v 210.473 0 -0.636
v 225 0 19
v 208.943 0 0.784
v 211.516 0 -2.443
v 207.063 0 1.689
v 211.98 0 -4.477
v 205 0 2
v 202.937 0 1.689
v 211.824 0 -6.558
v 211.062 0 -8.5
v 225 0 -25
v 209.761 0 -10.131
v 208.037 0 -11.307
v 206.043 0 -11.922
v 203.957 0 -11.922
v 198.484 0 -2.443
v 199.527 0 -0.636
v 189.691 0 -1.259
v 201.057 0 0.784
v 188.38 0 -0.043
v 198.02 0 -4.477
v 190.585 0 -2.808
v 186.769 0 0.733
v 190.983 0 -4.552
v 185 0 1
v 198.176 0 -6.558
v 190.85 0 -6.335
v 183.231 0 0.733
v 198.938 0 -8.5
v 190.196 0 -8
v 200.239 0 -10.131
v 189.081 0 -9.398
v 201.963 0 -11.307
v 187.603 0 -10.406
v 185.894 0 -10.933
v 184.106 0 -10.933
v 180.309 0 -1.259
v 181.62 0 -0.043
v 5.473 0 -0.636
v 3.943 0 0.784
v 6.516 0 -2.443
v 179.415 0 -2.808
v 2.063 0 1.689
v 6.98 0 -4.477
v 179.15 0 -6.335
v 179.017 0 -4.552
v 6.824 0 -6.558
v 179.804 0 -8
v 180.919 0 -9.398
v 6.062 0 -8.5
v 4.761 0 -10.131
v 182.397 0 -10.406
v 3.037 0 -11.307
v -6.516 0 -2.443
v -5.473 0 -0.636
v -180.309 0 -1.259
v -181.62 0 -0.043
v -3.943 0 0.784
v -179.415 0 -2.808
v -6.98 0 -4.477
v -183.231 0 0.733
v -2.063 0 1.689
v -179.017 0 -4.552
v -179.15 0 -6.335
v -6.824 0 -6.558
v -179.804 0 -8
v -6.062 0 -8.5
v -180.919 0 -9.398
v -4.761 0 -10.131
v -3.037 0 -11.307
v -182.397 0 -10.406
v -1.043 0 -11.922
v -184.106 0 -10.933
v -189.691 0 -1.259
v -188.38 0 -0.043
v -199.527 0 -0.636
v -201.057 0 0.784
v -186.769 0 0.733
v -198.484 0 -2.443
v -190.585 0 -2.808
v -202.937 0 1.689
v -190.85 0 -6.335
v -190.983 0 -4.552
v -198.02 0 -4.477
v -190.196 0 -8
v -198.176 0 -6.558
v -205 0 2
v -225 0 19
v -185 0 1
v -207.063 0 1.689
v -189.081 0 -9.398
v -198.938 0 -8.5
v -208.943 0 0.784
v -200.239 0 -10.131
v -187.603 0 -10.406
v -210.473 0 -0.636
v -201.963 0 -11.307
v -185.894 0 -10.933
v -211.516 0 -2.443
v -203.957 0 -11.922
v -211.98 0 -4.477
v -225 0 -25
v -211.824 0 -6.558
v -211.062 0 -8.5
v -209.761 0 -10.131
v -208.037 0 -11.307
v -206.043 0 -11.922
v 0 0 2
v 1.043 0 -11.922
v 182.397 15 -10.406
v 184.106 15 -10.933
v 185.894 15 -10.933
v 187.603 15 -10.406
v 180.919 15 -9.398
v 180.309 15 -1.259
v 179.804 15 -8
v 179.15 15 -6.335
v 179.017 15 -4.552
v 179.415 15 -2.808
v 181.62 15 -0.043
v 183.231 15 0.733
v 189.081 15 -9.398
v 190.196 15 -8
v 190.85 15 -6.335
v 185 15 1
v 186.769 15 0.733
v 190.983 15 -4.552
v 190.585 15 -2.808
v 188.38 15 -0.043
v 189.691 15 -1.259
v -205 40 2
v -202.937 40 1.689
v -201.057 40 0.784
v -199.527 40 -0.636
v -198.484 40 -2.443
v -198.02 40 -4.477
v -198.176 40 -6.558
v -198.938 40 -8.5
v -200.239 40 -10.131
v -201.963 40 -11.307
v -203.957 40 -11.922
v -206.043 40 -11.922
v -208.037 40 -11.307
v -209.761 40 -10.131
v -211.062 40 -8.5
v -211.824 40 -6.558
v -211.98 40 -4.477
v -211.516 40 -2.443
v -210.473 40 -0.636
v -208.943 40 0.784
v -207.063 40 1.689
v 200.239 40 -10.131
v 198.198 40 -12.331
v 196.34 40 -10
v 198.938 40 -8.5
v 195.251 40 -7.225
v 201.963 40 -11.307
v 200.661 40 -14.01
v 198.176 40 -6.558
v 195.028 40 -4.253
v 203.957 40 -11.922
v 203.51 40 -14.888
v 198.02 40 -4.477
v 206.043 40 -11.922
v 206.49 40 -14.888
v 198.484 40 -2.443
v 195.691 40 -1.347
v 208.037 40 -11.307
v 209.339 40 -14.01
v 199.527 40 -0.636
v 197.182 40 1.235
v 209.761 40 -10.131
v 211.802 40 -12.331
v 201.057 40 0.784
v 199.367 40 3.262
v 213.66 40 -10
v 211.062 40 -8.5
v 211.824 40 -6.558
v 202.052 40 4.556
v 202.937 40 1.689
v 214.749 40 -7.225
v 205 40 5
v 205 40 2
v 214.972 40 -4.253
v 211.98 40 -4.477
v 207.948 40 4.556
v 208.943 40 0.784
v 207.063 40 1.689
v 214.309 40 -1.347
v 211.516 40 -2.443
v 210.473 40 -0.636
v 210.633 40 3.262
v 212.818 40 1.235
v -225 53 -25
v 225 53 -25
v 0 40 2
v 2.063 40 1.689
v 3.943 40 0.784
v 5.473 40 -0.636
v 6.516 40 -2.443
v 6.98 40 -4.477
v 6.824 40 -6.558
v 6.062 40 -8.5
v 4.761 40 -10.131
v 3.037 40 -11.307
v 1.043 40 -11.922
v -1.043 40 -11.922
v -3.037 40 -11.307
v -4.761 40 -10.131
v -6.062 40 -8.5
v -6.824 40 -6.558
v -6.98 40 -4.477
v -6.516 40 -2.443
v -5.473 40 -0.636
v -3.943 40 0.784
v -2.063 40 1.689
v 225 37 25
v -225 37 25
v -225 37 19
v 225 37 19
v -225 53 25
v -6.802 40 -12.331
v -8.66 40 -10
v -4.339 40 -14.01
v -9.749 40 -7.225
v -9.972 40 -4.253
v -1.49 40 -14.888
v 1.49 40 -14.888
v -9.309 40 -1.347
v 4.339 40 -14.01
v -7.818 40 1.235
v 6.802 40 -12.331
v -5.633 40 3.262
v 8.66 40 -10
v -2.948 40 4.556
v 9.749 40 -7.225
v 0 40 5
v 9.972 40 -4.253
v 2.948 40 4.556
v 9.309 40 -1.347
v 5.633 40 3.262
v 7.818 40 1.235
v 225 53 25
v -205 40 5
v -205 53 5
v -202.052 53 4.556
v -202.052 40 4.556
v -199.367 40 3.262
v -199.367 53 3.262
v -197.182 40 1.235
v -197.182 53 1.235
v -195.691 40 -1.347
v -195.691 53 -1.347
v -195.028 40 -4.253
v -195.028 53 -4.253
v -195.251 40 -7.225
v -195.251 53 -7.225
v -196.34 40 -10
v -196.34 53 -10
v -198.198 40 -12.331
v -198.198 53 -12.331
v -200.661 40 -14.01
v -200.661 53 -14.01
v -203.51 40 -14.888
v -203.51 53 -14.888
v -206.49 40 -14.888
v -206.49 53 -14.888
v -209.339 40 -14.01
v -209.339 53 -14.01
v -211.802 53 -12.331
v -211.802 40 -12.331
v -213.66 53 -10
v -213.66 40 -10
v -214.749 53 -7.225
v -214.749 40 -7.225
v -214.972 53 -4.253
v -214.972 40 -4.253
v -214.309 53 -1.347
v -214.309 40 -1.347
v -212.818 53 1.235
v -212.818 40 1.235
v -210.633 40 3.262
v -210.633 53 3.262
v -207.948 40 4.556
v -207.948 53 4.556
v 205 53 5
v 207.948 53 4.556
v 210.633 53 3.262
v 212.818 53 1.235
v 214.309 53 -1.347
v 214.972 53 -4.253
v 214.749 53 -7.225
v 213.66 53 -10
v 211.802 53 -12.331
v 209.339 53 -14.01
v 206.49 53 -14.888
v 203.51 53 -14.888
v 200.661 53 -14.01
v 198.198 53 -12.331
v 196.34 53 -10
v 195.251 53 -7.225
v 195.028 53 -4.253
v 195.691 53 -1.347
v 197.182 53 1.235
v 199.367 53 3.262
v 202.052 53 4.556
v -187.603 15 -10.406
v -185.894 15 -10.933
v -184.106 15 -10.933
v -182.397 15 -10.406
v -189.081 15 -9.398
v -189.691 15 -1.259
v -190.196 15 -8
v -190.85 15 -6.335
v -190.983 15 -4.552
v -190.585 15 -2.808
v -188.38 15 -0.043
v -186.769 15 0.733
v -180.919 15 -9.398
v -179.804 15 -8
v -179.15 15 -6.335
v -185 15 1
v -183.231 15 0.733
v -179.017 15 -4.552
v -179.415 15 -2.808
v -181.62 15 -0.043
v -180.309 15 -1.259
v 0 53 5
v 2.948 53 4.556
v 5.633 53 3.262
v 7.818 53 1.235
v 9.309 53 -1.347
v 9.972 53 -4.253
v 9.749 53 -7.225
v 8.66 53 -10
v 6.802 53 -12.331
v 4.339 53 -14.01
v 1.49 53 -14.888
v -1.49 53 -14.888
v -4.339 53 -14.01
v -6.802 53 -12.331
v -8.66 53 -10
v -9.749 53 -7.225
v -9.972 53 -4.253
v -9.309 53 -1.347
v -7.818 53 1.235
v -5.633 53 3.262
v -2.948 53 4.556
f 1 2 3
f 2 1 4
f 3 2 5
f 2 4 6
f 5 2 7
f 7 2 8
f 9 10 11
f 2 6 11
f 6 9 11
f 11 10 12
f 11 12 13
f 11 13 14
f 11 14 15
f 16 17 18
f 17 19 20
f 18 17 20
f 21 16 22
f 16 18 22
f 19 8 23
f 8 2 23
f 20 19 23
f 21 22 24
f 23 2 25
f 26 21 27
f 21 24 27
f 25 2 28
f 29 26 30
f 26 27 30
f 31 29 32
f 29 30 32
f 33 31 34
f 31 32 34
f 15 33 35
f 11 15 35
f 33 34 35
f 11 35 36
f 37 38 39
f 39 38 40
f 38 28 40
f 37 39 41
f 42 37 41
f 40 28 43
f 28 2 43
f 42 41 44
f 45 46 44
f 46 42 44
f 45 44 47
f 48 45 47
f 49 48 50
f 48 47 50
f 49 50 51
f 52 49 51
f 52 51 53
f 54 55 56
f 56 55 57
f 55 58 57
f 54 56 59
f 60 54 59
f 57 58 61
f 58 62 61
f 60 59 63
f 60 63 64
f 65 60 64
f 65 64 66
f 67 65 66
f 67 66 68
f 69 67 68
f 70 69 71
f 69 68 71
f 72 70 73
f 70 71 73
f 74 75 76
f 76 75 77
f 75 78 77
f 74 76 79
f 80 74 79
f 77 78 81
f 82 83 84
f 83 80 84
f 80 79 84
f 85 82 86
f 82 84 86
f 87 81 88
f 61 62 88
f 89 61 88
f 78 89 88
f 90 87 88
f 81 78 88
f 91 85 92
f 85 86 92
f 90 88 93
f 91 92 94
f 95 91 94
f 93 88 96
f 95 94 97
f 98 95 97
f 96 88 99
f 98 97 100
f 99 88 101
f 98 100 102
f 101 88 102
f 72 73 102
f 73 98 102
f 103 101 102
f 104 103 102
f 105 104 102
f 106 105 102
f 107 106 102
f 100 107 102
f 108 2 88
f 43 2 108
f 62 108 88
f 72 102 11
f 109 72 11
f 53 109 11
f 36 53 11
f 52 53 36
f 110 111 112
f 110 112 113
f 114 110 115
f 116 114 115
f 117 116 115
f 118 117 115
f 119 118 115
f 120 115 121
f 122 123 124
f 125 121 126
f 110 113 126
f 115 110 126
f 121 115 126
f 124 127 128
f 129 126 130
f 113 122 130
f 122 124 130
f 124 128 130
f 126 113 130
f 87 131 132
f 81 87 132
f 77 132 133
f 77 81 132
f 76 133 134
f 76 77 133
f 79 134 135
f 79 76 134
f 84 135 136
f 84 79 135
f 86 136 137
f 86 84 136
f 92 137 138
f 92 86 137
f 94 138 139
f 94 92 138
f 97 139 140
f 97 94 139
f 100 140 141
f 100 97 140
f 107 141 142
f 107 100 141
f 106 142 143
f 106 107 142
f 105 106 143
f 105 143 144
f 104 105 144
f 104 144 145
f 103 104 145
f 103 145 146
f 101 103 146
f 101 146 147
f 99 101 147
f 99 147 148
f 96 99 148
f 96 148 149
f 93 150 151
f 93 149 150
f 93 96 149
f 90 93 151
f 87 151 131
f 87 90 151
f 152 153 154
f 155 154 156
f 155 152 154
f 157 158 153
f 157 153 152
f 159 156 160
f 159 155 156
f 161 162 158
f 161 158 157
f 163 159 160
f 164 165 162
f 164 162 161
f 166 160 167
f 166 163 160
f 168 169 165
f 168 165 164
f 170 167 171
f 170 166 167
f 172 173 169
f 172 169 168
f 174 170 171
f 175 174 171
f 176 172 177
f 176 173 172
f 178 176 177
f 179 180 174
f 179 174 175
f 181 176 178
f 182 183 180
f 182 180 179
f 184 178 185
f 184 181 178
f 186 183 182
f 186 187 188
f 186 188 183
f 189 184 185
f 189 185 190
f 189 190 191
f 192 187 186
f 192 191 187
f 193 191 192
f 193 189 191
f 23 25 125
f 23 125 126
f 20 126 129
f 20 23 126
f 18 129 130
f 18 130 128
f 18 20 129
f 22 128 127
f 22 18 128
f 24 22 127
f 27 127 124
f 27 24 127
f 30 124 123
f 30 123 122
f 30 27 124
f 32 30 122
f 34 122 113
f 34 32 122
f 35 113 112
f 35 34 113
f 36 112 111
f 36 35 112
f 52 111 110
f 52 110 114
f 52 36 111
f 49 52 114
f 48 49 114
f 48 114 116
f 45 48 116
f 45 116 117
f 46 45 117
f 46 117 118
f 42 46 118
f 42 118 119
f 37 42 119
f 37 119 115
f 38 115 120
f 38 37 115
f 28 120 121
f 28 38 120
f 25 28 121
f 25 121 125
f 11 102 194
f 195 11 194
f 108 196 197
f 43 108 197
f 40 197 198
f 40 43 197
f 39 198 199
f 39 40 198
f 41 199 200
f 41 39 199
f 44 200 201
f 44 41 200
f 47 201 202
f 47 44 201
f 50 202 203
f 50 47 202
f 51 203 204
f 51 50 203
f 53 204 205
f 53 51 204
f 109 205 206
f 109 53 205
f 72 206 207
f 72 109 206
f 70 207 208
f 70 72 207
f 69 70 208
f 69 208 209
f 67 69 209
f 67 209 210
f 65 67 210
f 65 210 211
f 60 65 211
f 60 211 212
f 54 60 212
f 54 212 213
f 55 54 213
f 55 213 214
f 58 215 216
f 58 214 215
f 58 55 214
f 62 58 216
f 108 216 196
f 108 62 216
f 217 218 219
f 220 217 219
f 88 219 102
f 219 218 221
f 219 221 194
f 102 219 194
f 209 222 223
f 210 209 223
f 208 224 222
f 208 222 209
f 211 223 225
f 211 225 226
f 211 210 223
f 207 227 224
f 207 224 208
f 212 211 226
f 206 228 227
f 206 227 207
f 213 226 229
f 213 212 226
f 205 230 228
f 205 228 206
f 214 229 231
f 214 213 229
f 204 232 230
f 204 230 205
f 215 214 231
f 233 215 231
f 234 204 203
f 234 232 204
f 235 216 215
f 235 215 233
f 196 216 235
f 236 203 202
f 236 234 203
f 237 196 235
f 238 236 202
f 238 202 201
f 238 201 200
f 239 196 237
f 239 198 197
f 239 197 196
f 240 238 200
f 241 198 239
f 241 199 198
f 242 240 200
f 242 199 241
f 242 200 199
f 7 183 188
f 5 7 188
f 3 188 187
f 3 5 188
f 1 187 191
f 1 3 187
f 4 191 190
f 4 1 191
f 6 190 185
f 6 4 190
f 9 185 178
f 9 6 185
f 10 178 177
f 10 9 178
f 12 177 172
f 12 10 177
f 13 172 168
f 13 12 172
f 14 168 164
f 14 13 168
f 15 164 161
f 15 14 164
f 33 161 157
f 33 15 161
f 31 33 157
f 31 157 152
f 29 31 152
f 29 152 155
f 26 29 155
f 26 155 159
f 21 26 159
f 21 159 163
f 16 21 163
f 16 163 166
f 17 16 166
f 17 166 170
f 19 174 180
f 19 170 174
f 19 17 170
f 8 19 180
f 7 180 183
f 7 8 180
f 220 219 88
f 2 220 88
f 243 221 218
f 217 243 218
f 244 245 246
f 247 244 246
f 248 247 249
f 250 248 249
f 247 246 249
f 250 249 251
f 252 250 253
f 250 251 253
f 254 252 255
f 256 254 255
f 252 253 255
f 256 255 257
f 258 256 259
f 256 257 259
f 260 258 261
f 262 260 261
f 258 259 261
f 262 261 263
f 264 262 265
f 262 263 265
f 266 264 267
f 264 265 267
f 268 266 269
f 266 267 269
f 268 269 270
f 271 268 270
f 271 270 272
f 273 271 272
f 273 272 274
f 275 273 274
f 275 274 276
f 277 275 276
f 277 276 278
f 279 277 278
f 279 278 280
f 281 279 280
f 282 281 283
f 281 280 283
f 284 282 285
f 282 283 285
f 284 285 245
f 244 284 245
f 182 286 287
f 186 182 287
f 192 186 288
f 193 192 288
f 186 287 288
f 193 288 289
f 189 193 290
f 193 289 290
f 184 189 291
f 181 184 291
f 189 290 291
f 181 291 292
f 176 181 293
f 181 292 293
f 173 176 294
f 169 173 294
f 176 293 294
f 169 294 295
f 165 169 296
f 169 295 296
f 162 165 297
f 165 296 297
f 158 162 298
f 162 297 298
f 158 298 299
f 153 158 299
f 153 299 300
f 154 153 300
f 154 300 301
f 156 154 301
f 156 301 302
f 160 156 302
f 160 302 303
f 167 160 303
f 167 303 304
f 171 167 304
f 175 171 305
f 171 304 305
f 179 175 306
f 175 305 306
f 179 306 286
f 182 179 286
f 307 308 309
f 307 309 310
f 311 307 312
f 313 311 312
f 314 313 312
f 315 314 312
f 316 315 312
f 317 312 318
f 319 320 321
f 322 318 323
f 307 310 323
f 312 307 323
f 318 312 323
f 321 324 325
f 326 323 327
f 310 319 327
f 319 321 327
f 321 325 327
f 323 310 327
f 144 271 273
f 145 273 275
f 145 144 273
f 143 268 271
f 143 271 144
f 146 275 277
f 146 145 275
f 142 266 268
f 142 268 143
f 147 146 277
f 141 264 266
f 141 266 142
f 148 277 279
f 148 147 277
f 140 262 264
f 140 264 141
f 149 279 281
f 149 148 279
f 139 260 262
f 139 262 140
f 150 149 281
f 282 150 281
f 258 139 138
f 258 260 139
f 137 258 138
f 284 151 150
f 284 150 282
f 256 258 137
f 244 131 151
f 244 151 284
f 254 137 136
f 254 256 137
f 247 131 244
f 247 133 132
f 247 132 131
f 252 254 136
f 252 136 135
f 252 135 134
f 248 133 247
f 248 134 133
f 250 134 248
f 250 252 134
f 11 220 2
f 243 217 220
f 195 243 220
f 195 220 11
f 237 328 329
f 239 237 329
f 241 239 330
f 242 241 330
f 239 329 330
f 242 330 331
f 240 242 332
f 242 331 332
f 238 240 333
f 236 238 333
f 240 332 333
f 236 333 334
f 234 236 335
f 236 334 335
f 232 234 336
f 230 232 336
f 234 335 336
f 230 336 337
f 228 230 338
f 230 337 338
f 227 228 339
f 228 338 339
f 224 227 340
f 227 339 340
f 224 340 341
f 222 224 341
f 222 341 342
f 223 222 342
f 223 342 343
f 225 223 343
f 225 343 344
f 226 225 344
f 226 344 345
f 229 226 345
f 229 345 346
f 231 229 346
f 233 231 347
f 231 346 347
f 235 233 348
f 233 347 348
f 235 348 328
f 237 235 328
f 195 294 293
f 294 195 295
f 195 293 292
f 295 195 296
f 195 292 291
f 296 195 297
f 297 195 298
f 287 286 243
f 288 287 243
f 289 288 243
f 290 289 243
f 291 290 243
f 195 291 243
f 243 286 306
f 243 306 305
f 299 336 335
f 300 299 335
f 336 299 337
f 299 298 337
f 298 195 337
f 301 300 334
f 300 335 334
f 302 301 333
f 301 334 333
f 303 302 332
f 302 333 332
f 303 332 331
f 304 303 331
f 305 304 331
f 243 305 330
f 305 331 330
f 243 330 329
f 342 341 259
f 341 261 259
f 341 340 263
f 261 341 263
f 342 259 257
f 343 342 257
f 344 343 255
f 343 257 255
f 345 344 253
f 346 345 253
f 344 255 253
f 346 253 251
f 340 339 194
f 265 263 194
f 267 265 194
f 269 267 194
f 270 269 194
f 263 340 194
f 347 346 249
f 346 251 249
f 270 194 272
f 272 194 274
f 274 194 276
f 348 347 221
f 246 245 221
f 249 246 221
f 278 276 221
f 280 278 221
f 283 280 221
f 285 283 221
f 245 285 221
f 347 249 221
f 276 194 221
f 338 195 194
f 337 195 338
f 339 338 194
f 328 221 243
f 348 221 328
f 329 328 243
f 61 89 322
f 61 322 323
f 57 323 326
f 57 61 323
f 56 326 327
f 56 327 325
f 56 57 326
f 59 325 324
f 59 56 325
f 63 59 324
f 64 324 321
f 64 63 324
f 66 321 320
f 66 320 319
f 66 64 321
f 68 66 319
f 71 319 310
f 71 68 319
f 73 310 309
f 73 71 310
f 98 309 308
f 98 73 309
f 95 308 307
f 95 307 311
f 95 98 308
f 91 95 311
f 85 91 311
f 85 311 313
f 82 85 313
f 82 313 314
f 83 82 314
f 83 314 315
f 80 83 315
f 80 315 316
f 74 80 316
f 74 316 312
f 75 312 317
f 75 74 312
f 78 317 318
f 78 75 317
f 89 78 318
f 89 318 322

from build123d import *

# Parameters (mm, degrees)
EXTRUDE_1_DEPTH          = 225
EXTRUDE_1_DEPTH_BACK     = 225
CUT_EXTRUDE_1_DEPTH      = 233.505913903
CUT_EXTRUDE_1_DEPTH_BACK = 233.505913903
SKETCH_2_R               = 7
SKETCH_4_R               = 10
CUT_EXTRUDE_2_DEPTH      = 13
SKETCH_6_R               = 6
CUT_EXTRUDE_4_DEPTH      = 15


with BuildPart() as part:
    # ｽｹｯﾁ1 → ﾎﾞｽ - 押し出し1 (new, two sides: drawn at the far end of the back side and taken through both)
    with BuildSketch(Plane(origin=(0, 0, 0), x_dir=(0, 0, -1), z_dir=(1, 0, 0)).offset(-EXTRUDE_1_DEPTH_BACK)):
        Polygon((-19, 0), (25, 0), (25, 53), (-25, 53), (-25, 37), (-19, 37), align=None)
    extrude(amount=EXTRUDE_1_DEPTH + EXTRUDE_1_DEPTH_BACK)

    # ｽｹｯﾁ2 → ｶｯﾄ - 押し出し1 (cut, two sides: drawn at the far end of the back side and taken through both)
    with BuildSketch(Plane(origin=(0, 0, 0), x_dir=(1, 0, 0), z_dir=(0, 1, 0)).offset(-CUT_EXTRUDE_1_DEPTH_BACK)):
        with Locations((-205, 5)):
            Circle(SKETCH_2_R)
        with Locations((0, 5)):
            Circle(SKETCH_2_R)
        with Locations((205, 5)):
            Circle(SKETCH_2_R)
    extrude(amount=CUT_EXTRUDE_1_DEPTH + CUT_EXTRUDE_1_DEPTH_BACK, mode=Mode.SUBTRACT)

    # ｽｹｯﾁ4 → ｶｯﾄ - 押し出し2 (cut)
    with BuildSketch(Plane(origin=(0, 53, 0), x_dir=(1, 0, 0), z_dir=(0, 1, 0))):
        with Locations((-205, 5)):
            Circle(SKETCH_4_R)
        with Locations((0, 5)):
            Circle(SKETCH_4_R)
        with Locations((205, 5)):
            Circle(SKETCH_4_R)
    extrude(amount=-CUT_EXTRUDE_2_DEPTH, mode=Mode.SUBTRACT)

    # ｽｹｯﾁ6 → ｶｯﾄ - 押し出し4 (cut)
    with BuildSketch(Plane(origin=(0, 0, 0), x_dir=(1, 0, 0), z_dir=(0, 1, 0))):
        with Locations((-185, 5)):
            Circle(SKETCH_6_R)
        with Locations((185, 5)):
            Circle(SKETCH_6_R)
    extrude(amount=CUT_EXTRUDE_4_DEPTH, mode=Mode.SUBTRACT)


solid = part.part
